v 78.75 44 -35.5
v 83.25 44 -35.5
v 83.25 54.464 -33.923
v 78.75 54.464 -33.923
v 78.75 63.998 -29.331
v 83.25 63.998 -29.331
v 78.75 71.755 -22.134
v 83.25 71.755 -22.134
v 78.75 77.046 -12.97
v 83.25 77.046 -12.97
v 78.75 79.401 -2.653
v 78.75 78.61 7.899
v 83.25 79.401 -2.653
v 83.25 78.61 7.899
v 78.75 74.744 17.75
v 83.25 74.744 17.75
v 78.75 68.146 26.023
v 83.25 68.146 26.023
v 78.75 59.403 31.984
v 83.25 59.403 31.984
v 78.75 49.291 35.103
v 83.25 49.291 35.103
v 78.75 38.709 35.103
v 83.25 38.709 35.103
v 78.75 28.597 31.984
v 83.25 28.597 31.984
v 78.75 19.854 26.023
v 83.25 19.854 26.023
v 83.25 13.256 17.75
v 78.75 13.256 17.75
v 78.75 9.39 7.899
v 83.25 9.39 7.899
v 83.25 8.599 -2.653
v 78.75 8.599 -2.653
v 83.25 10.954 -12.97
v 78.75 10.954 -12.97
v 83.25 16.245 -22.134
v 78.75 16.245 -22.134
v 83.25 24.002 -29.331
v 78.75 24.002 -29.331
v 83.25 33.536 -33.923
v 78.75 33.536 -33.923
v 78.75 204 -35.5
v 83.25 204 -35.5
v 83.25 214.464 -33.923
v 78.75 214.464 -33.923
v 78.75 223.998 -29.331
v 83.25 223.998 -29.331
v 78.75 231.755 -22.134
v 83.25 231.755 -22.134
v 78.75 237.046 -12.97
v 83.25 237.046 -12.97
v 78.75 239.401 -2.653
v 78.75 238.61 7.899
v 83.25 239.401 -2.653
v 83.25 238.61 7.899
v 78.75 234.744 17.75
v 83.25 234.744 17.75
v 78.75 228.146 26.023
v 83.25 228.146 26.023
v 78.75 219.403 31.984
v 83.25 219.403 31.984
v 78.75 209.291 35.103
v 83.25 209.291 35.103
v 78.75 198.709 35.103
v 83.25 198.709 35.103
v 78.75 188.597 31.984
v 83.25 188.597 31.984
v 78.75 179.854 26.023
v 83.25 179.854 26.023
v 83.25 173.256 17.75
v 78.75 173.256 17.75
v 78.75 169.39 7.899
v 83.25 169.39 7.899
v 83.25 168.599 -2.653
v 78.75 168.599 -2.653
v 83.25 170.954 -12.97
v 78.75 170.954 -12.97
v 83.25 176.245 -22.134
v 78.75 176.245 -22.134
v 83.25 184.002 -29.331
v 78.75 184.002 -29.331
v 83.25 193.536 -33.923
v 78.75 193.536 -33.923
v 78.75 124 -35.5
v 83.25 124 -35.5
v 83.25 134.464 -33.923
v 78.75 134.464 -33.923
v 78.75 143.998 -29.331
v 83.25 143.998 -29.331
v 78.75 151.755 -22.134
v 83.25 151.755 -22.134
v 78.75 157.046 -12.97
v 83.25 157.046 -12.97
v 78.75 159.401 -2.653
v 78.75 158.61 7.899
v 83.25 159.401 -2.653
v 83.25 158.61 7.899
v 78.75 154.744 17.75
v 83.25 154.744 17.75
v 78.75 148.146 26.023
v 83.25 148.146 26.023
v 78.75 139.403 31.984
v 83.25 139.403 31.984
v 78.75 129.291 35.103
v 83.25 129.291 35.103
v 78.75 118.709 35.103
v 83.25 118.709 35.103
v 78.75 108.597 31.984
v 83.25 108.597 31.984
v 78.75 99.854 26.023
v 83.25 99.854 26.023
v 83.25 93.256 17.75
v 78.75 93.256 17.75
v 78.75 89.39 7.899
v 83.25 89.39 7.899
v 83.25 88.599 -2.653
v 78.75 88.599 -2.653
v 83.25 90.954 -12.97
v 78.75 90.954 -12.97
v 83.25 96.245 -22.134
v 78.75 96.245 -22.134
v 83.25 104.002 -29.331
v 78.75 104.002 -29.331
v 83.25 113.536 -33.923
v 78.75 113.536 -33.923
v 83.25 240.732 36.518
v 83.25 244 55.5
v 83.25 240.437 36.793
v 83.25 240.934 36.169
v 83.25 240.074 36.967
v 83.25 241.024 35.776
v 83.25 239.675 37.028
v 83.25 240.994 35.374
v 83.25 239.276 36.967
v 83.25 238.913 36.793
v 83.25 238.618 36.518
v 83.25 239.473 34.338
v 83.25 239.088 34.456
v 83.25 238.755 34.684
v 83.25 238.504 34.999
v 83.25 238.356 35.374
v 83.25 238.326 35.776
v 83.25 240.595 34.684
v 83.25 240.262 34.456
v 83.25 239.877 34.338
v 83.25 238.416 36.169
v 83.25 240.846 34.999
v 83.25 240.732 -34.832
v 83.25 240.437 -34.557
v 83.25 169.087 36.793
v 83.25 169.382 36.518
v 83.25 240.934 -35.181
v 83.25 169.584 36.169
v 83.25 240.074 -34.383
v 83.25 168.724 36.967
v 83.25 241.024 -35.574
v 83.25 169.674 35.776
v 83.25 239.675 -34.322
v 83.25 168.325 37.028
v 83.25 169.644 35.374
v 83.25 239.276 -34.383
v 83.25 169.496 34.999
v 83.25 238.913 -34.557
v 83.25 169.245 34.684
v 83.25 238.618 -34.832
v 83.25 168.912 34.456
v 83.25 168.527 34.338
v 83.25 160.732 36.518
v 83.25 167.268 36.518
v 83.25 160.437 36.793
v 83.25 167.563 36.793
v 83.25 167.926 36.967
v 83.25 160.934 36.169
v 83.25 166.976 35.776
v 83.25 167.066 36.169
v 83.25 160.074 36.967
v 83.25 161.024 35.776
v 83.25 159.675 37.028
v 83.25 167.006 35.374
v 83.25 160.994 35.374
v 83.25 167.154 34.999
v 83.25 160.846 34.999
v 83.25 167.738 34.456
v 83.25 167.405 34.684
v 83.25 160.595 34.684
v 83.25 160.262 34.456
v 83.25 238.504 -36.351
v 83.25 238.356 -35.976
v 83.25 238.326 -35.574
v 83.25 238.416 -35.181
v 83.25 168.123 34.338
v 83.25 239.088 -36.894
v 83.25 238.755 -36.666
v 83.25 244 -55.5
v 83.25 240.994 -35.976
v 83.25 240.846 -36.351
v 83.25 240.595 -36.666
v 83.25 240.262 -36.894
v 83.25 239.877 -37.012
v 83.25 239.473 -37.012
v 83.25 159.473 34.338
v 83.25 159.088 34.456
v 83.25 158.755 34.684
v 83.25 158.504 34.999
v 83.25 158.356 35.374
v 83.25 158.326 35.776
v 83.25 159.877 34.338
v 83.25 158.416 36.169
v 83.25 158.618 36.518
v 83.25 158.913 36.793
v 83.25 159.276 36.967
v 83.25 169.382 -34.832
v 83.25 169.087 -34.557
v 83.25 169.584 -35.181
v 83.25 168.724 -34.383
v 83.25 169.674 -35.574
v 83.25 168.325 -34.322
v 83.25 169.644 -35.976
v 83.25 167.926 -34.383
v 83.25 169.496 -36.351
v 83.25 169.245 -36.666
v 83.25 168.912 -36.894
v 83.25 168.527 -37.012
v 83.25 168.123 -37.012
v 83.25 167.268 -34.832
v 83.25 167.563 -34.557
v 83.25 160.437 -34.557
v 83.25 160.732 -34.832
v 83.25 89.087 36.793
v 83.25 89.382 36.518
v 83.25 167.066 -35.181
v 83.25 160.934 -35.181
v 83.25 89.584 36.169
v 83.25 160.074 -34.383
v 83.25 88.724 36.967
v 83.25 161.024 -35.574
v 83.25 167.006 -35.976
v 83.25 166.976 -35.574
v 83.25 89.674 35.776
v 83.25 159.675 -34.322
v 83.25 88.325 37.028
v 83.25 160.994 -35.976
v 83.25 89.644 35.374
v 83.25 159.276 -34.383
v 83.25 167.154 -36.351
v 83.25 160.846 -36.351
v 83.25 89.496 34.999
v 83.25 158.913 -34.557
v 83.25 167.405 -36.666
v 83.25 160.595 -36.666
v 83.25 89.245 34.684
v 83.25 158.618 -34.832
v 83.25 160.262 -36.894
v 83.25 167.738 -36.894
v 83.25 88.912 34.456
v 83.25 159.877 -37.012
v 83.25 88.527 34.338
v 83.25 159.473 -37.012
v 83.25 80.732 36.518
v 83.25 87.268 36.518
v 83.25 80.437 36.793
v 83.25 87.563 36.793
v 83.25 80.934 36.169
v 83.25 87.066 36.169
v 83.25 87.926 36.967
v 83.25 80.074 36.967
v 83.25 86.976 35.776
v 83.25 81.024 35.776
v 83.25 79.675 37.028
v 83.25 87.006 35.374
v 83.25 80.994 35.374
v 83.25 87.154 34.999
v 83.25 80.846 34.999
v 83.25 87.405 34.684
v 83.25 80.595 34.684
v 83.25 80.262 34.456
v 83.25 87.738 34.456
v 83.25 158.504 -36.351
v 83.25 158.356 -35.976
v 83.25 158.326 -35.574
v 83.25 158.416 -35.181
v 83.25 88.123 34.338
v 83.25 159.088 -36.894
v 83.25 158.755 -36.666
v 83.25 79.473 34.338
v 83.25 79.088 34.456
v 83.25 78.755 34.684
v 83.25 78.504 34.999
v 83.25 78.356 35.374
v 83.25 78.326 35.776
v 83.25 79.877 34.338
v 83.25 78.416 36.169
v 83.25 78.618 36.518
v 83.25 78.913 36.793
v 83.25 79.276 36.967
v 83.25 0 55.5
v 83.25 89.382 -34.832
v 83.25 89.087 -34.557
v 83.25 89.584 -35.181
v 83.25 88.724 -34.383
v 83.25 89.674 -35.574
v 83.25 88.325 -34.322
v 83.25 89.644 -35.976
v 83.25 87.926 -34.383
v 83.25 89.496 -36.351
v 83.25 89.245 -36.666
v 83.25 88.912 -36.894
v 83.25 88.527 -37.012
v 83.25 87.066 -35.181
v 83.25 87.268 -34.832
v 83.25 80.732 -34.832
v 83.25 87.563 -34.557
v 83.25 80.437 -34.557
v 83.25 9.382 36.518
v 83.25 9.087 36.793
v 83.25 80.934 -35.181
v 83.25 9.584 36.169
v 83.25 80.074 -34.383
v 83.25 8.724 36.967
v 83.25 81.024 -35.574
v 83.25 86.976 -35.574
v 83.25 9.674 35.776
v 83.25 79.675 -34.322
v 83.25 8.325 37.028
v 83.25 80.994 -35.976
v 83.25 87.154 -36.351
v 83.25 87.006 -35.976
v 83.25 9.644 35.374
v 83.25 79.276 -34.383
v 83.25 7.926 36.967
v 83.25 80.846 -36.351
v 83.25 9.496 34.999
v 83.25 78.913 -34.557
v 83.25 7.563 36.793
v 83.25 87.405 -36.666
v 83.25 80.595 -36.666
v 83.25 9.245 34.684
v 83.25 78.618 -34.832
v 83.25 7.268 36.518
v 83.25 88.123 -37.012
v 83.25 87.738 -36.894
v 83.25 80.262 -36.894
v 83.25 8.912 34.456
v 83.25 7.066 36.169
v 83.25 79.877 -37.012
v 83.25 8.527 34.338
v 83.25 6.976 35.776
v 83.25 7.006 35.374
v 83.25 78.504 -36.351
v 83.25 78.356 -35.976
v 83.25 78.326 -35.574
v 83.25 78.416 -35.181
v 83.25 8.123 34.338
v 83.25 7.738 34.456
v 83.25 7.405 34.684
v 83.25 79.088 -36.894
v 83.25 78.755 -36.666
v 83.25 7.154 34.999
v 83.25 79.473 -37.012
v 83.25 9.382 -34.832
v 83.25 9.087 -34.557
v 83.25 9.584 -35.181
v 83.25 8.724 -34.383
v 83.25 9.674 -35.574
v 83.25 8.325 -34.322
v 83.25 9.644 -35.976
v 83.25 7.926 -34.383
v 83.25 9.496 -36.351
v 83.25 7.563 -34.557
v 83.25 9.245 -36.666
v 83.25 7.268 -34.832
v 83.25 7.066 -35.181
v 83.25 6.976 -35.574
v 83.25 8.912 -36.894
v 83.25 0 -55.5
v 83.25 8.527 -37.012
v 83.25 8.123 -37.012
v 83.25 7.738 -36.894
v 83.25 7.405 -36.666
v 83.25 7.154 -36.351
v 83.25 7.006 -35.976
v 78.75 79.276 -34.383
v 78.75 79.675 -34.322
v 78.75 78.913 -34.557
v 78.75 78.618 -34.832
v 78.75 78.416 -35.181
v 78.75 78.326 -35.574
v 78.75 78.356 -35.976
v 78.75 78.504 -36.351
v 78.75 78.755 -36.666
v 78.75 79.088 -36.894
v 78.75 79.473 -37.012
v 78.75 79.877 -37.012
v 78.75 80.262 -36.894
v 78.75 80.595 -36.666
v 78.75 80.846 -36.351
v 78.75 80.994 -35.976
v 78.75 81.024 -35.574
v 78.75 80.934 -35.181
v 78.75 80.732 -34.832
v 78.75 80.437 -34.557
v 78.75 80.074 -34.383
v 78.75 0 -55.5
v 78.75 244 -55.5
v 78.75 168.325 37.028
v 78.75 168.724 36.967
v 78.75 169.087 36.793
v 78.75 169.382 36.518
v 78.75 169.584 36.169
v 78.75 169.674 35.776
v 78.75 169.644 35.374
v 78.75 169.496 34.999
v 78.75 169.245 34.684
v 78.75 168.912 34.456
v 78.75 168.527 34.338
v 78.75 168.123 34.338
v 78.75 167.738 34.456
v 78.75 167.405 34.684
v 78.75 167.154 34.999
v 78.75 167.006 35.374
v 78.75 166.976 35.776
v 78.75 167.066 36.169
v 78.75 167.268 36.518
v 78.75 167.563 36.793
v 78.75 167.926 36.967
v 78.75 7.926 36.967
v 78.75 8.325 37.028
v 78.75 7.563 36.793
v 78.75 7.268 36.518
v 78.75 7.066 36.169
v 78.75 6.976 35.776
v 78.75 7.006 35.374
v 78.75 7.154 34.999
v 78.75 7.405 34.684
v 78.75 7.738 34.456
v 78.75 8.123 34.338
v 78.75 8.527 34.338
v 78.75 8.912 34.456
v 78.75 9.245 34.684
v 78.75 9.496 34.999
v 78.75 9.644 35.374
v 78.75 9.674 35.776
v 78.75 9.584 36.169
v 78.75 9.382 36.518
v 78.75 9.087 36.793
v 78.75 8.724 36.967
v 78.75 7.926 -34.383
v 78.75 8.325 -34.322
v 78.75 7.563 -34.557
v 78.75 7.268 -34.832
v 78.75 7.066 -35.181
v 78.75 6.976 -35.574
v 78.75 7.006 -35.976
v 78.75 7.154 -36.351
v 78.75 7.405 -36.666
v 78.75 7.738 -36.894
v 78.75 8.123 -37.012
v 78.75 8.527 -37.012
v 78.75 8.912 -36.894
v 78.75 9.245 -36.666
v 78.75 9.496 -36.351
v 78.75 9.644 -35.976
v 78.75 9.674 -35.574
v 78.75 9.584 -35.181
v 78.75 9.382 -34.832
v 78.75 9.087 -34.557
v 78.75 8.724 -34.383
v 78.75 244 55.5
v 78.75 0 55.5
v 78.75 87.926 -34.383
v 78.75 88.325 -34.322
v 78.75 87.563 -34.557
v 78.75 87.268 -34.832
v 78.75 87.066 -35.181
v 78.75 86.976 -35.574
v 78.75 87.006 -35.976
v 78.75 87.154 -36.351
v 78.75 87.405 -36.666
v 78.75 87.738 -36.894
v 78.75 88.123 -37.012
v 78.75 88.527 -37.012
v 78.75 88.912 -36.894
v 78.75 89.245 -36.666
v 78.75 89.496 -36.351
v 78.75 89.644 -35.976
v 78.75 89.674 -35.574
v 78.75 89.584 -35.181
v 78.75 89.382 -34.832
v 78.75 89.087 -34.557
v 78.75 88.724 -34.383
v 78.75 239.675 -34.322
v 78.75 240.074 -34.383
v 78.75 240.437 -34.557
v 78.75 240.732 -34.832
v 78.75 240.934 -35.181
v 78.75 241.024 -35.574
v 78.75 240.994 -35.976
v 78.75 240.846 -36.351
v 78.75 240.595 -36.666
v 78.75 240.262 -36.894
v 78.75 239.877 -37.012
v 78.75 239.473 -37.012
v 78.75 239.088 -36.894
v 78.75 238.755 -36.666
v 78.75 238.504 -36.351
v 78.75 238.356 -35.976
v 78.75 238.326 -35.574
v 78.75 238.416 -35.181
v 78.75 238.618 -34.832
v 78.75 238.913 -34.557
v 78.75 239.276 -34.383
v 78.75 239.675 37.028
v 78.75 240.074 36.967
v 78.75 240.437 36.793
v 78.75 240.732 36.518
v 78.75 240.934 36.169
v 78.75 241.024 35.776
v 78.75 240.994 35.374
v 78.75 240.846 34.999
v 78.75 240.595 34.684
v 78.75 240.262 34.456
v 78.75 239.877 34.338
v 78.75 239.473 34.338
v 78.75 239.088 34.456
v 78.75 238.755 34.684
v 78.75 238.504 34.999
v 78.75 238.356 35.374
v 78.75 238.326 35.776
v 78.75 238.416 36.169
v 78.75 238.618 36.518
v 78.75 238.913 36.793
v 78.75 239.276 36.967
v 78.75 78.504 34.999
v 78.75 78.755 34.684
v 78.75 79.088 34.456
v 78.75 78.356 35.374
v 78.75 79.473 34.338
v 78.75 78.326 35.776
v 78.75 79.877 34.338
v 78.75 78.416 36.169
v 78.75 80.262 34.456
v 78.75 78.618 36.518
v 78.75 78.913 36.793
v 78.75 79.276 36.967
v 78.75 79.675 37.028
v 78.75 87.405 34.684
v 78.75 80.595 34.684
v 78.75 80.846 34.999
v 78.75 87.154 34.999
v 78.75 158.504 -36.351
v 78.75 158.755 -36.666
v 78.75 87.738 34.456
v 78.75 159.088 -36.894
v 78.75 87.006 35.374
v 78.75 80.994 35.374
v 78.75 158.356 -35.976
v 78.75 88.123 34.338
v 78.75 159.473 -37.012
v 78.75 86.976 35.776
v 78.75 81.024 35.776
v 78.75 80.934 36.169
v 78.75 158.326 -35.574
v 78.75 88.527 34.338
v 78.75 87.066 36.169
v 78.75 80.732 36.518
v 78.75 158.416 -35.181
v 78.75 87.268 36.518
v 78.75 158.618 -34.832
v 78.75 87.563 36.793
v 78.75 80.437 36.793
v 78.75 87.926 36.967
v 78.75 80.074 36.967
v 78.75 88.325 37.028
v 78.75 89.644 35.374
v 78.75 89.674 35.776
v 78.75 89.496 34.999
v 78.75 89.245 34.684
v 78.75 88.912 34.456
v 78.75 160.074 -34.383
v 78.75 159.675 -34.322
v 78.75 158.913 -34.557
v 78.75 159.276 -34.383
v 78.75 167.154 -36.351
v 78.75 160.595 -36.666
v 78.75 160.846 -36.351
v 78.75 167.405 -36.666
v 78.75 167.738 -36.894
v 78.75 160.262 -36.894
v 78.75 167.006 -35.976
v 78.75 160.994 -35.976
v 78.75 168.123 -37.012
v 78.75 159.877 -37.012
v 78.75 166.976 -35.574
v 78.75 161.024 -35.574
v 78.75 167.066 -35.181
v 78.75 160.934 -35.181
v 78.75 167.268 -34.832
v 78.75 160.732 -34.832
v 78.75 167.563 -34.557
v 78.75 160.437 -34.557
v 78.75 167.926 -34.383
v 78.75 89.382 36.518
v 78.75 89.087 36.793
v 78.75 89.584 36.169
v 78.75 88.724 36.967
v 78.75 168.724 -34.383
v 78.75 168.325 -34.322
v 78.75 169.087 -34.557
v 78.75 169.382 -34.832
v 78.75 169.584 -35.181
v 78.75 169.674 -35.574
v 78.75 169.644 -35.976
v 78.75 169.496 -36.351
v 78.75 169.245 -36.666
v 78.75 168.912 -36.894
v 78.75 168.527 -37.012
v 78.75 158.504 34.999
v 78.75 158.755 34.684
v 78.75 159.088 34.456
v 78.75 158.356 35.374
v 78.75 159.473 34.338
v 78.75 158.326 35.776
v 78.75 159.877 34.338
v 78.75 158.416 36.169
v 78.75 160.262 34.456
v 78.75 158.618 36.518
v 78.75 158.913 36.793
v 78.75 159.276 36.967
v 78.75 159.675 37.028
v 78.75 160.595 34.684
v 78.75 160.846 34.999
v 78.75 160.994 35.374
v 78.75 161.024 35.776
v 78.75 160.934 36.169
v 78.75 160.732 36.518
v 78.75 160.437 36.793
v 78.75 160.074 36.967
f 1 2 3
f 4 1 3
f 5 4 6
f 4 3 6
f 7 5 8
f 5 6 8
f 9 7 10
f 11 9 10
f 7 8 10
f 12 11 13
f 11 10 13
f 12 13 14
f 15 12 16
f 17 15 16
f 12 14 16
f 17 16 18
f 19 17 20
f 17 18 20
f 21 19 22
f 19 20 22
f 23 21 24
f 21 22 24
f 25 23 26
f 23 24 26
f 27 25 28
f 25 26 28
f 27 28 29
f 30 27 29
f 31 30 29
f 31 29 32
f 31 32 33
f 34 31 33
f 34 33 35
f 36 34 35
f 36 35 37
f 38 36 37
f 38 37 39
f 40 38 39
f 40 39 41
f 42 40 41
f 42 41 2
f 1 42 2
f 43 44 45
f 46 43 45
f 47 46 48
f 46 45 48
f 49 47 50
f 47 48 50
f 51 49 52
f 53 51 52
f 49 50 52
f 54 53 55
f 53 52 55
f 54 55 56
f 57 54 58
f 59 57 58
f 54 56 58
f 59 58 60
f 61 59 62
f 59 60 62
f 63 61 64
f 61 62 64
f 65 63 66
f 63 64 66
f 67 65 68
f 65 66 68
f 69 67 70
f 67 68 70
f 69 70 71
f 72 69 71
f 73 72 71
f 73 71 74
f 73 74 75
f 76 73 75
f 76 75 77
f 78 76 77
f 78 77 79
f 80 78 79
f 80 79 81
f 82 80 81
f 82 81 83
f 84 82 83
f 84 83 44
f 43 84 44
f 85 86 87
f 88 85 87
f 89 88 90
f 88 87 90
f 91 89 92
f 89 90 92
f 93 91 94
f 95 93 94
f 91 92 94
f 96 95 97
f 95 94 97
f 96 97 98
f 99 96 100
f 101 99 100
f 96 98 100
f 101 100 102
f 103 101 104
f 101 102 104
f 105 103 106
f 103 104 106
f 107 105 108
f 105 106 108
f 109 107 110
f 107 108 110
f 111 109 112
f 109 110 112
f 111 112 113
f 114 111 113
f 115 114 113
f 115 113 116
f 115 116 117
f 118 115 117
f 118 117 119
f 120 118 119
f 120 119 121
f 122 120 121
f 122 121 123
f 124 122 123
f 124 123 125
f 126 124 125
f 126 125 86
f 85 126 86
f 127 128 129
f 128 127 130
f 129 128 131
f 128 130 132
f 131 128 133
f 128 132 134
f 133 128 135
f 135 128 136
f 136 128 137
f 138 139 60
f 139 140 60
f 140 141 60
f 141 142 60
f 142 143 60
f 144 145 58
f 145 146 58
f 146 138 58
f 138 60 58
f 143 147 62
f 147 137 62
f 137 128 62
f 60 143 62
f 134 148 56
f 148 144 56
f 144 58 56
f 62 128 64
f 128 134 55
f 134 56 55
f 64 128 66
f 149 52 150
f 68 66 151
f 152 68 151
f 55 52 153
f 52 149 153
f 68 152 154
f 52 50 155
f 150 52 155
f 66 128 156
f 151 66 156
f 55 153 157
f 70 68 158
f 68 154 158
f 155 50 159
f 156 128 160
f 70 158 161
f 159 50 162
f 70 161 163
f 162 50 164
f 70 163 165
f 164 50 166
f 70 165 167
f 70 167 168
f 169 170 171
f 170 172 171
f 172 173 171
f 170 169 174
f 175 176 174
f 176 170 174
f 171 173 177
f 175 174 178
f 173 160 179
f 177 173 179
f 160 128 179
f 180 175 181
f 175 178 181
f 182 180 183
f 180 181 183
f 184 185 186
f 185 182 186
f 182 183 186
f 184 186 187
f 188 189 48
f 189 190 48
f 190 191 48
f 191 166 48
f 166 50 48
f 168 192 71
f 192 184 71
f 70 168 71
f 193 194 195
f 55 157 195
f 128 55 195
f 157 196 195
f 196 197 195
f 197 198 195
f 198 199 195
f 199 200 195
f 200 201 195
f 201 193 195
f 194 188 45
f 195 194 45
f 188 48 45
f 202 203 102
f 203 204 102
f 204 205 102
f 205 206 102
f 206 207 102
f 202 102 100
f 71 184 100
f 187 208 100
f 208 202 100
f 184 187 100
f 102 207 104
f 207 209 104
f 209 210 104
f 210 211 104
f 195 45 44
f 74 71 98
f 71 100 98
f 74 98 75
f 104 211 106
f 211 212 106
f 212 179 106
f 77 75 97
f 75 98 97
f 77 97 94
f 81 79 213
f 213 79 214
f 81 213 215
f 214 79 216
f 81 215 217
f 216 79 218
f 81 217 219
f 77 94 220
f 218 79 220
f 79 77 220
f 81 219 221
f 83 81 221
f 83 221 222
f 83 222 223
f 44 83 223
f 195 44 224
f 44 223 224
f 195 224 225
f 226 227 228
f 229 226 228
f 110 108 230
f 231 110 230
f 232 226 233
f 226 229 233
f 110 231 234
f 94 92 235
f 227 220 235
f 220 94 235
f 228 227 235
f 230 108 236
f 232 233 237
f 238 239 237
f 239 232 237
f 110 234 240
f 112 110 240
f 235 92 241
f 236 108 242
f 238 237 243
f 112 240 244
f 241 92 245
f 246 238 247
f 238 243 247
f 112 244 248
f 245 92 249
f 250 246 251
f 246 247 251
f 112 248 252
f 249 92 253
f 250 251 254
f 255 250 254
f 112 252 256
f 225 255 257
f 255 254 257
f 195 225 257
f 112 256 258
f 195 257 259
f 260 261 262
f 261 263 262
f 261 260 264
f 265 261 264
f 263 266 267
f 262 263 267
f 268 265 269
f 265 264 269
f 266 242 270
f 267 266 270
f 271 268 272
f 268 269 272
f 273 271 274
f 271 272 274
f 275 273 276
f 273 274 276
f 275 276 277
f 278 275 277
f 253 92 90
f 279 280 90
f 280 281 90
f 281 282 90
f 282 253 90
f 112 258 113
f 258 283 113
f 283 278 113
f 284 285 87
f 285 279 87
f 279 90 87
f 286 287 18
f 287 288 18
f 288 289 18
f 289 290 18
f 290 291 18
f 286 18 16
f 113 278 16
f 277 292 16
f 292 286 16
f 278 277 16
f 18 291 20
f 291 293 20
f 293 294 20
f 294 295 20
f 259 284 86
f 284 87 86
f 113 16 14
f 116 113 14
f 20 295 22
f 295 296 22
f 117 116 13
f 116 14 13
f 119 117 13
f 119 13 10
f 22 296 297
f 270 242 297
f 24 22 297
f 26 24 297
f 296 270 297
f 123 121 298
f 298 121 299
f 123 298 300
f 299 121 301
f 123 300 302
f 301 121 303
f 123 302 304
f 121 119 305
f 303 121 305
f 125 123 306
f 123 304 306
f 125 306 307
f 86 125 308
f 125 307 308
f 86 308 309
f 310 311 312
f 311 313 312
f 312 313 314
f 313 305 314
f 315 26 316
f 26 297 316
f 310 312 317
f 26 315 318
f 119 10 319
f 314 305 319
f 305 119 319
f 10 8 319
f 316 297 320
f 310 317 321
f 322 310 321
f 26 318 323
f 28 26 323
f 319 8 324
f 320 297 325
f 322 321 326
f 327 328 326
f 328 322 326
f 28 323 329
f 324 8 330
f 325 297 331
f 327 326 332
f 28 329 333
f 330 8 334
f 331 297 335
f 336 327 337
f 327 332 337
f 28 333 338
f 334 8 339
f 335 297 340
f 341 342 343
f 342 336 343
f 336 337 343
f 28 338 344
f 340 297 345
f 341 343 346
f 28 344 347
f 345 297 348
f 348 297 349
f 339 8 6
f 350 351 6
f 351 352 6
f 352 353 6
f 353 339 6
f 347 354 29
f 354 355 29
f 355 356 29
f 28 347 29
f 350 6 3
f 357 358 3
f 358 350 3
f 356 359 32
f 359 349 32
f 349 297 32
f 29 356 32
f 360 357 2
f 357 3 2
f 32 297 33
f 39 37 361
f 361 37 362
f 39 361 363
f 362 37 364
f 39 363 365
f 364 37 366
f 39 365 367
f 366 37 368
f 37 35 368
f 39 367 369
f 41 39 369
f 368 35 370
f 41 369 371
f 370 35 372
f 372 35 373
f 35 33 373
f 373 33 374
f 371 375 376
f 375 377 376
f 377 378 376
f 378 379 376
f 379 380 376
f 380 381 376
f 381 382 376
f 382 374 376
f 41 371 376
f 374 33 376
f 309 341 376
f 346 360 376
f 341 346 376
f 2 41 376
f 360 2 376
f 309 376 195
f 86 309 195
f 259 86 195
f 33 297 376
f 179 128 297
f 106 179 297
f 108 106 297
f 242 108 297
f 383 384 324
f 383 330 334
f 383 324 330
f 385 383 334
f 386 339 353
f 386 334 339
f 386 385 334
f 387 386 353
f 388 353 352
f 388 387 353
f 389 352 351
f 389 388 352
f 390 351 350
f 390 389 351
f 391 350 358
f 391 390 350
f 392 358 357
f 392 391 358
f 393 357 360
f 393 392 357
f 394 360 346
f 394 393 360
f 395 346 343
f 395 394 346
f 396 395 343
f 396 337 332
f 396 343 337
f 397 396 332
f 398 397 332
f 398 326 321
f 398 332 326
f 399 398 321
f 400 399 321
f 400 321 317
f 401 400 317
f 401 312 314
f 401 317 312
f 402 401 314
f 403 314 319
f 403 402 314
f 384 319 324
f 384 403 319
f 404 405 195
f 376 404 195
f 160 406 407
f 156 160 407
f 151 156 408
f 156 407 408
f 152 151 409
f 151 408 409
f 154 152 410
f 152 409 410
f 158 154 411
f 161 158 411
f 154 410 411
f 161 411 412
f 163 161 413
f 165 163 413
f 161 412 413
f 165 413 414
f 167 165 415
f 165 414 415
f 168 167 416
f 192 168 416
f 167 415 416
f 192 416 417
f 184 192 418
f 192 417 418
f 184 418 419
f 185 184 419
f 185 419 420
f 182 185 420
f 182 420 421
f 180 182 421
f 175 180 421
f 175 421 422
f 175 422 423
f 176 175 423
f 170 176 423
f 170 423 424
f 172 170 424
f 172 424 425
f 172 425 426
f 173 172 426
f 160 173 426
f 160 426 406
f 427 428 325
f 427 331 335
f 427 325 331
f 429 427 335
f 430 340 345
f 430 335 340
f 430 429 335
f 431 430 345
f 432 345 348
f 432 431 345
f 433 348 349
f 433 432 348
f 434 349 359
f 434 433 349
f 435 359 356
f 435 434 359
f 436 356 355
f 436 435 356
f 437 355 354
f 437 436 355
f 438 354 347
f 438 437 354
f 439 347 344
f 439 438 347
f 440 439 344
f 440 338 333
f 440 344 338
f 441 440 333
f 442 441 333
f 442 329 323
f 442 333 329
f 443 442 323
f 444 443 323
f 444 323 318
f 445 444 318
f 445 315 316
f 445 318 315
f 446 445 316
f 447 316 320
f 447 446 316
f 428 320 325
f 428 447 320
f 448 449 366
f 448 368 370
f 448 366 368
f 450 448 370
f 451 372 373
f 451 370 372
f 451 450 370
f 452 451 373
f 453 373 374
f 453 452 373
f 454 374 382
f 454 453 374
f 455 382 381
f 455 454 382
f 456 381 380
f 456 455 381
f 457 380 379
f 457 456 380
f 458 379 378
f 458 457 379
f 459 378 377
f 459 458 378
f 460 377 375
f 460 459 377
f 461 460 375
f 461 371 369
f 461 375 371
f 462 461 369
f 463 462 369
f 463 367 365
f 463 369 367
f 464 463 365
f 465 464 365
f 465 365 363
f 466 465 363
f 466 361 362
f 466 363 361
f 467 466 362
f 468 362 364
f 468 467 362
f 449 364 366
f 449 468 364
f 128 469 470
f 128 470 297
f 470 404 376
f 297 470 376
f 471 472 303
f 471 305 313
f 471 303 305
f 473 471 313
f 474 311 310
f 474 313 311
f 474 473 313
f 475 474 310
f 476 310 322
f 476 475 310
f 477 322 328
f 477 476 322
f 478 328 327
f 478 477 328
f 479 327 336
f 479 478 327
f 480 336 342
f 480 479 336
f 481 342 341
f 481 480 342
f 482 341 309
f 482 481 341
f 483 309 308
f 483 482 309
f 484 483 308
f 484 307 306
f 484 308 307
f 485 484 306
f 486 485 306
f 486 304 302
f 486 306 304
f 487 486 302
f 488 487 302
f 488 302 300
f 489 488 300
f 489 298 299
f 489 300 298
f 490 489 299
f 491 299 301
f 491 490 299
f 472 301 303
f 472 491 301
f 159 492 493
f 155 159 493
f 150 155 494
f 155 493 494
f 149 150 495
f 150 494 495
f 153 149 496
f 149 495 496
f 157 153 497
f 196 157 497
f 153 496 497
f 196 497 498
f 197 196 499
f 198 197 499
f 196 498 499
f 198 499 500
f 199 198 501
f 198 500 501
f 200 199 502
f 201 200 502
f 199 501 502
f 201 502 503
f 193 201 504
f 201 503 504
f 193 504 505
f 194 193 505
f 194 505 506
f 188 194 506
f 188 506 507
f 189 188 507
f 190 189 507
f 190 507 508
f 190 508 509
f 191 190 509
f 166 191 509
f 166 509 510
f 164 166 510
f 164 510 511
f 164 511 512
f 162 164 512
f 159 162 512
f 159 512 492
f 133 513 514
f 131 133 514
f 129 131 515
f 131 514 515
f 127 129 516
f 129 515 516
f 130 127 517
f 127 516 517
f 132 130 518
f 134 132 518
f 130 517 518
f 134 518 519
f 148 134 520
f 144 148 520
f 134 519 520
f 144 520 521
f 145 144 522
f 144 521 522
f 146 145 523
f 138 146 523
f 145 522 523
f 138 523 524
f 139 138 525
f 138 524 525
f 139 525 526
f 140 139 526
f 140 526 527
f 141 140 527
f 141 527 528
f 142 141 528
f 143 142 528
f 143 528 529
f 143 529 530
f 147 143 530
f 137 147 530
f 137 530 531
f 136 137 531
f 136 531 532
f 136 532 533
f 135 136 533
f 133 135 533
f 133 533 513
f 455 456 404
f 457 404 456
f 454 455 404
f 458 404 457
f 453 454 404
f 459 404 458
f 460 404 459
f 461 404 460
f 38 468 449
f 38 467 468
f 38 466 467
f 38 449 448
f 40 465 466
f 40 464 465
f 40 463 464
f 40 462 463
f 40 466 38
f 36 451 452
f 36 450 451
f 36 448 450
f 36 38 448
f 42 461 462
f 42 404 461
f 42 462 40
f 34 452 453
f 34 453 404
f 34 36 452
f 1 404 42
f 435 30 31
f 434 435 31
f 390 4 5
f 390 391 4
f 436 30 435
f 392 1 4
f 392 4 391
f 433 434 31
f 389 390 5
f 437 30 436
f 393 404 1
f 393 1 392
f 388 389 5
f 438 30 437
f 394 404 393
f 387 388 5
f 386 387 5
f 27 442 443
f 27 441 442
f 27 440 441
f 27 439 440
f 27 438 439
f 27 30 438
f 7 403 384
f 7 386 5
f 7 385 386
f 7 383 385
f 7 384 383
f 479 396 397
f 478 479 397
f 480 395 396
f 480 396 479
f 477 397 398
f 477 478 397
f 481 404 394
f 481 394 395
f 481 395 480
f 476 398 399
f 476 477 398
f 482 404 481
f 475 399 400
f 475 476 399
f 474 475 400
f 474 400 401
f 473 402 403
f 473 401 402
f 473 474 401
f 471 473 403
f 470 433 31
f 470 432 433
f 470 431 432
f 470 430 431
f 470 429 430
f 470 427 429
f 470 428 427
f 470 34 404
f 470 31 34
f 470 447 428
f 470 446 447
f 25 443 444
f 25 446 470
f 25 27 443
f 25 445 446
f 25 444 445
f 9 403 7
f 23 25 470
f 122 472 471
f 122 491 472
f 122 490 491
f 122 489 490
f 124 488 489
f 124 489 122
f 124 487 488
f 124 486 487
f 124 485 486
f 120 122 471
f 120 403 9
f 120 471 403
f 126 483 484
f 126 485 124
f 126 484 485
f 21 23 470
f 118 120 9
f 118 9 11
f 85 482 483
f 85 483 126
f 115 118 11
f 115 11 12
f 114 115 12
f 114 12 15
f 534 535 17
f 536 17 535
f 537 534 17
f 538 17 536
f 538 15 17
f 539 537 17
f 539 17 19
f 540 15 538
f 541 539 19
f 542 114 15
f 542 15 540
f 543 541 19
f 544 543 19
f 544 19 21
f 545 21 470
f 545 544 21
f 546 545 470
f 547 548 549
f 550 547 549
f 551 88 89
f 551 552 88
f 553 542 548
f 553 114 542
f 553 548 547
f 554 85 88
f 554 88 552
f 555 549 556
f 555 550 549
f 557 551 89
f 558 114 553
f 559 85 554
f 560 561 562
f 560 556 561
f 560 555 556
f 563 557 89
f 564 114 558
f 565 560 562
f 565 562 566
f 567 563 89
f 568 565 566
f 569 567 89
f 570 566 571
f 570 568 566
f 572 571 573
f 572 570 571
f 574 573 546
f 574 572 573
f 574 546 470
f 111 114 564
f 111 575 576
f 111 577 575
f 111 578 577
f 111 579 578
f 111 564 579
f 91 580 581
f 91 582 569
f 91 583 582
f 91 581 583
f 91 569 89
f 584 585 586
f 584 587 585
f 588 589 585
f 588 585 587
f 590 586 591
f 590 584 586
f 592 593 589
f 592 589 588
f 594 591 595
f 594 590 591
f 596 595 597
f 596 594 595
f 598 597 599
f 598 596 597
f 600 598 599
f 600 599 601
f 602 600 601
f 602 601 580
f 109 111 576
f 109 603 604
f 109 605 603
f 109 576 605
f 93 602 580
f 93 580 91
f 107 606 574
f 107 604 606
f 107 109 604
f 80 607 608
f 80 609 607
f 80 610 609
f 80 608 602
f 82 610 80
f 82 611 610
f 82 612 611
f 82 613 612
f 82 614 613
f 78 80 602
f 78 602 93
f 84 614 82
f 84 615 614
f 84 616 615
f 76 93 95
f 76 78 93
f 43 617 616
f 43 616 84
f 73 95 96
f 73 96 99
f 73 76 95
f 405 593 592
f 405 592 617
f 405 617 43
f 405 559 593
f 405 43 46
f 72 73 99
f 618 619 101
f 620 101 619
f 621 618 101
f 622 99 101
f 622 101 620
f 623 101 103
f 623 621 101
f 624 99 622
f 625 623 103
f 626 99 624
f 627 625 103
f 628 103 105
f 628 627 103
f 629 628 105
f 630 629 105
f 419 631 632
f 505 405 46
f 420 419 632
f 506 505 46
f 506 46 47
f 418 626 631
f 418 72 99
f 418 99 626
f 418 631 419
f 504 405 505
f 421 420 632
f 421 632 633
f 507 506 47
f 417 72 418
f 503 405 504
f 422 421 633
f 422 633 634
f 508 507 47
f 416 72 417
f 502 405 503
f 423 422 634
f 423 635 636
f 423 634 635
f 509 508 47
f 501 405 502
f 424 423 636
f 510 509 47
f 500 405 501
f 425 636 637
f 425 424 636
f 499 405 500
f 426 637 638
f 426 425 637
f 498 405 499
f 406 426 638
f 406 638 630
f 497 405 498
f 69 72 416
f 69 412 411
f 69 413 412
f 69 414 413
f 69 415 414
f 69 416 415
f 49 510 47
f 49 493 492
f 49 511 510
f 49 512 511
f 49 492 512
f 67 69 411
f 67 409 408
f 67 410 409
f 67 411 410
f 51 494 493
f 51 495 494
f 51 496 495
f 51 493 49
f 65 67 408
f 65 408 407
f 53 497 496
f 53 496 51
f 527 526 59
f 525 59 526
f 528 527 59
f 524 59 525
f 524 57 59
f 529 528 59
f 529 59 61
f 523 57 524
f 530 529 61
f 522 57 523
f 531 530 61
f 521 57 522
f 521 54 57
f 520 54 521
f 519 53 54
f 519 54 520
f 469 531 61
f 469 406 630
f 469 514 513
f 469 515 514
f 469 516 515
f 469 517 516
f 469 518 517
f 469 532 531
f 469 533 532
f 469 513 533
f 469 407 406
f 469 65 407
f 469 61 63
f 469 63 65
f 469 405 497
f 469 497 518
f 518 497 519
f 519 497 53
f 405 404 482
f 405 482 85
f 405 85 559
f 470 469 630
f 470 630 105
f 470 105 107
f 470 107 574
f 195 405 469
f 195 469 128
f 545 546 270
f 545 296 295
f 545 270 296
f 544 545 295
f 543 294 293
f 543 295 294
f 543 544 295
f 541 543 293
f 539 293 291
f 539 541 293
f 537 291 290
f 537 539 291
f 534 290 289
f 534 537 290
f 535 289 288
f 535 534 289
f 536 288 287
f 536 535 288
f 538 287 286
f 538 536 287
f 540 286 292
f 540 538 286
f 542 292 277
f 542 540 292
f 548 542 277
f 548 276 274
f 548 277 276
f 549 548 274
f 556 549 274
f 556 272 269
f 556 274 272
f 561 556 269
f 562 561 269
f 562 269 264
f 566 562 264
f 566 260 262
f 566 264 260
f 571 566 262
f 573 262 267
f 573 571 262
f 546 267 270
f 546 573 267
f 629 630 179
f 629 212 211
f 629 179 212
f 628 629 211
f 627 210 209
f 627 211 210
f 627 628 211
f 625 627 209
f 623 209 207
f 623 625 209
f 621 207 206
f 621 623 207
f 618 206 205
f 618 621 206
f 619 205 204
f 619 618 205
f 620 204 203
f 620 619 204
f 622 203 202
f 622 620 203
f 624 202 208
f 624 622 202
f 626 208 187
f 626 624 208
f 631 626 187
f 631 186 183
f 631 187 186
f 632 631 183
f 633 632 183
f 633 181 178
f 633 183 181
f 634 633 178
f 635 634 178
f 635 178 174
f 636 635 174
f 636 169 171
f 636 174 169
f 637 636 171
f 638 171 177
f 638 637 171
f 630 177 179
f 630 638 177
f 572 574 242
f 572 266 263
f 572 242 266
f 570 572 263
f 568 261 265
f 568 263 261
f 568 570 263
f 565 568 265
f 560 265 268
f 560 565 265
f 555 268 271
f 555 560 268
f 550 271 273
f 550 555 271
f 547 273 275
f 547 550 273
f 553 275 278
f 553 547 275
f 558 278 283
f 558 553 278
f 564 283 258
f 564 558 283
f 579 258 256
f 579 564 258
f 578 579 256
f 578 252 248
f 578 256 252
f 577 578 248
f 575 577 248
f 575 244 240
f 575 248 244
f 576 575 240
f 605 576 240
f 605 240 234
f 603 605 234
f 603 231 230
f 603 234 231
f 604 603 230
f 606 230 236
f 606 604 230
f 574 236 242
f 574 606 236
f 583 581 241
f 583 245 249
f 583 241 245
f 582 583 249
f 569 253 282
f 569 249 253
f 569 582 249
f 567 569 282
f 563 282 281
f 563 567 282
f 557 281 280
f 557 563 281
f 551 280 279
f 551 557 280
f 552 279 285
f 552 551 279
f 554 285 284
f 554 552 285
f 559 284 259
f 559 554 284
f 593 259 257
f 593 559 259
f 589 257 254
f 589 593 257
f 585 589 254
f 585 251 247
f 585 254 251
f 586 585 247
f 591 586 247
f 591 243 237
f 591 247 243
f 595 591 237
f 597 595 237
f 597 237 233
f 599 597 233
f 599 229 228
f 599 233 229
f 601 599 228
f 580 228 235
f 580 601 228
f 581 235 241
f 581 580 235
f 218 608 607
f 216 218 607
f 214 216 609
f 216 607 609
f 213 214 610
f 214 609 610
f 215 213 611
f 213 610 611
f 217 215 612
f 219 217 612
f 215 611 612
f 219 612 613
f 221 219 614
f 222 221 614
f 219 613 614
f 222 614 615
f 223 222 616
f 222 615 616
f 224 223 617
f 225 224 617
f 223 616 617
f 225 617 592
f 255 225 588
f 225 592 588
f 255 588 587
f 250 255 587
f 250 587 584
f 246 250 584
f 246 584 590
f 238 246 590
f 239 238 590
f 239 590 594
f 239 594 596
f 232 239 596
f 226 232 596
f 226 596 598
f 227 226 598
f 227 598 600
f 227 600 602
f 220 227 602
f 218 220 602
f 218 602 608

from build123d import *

# Parameters (mm, degrees)
SKETCH1_W                     = 166.5
SKETCH1_H                     = 111
BOSS_EXTRUDE1_DEPTH           = 30.5
SHELL1_T                      = -4.5
CUT_EXTRUDE1_REACH            = 105.377
SKETCH2_W                     = 157
SKETCH2_H                     = 92
TAP_DRILL_FOR_6_32_TAP1_D     = 2.7051
TAP_DRILL_FOR_6_32_TAP1_DEPTH = 4.5
LPATTERN1_COUNT               = 8
LPATTERN1_PITCH               = 30.5
SKETCH7_W                     = 102
SKETCH7_H                     = 4.5
CUT_EXTRUDE2_DEPTH            = 5
SKETCH8_W                     = 102
SKETCH8_H                     = 157
CUT_EXTRUDE3_DEPTH            = 5
CUT_EXTRUDE4_REACH            = 302.564
SKETCH9_R                     = 35.5
TAP_DRILL_FOR_6_32_TAP2_D     = 2.7051
CUT_EXTRUDE6_START            = -162
SKETCH14_W                    = 111
SKETCH14_H                    = 244
CUT_EXTRUDE6_DEPTH            = 162


with BuildPart() as part:
    # Sketch1 → Boss-Extrude1 (new body)
    with BuildSketch(Plane(origin=(0, 0, 0), x_dir=(1, 0, 0), z_dir=(0, 1, 0))):
        Rectangle(SKETCH1_W, SKETCH1_H)
    extrude(amount=BOSS_EXTRUDE1_DEPTH)

    # Shell1
    shell1_openings = [part.faces().sort_by_distance(p)[0] for p in [
        (0, 30.5, 0),
        (-83.25, 15.25, 0),
    ]]
    offset(amount=SHELL1_T, openings=shell1_openings, kind=Kind.INTERSECTION)

    # Sketch2 → Cut-Extrude1 (cut, up to next)
    with BuildSketch(Plane(origin=(0, 4.5, 0), x_dir=(1, 0, 0), z_dir=(0, 1, 0)), mode=Mode.PRIVATE) as cut_extrude1_sk1:
        with Locations((0.25, 0)):
            Rectangle(SKETCH2_W, SKETCH2_H)
    cut_extrude1_tool1 = extrude(cut_extrude1_sk1.sketch, amount=-CUT_EXTRUDE1_REACH, mode=Mode.PRIVATE) & part.part
    add(cut_extrude1_tool1.solids().sort_by_distance((0.25, 4.5, 0))[0], mode=Mode.SUBTRACT)

    # Tap Drill for #6-32 Tap1
    with Locations(Plane(origin=(0, 0, -55.5), x_dir=(-1, 0, 0), z_dir=(0, 0, -1))):
        with Locations((42.66, 10.84), (-58.75, 10.84)):
            tap_drill_for_6_32_tap1 = Hole(TAP_DRILL_FOR_6_32_TAP1_D / 2, depth=TAP_DRILL_FOR_6_32_TAP1_DEPTH)

    # Mirror1: Tap Drill for #6-32 Tap1 across plane
    add(tap_drill_for_6_32_tap1.mirror(Plane.XY), mode=Mode.SUBTRACT)


with BuildPart() as lpattern1_1:
    # LPattern1: pattern copy
    add(part.part.moved(Location(Vector(0, 1, 0) * (1 * LPATTERN1_PITCH))))


with BuildPart() as lpattern1_2:
    # LPattern1: pattern copy
    add(part.part.moved(Location(Vector(0, 1, 0) * (2 * LPATTERN1_PITCH))))


with BuildPart() as lpattern1_3:
    # LPattern1: pattern copy
    add(part.part.moved(Location(Vector(0, 1, 0) * (3 * LPATTERN1_PITCH))))


with BuildPart() as lpattern1_4:
    # LPattern1: pattern copy
    add(part.part.moved(Location(Vector(0, 1, 0) * (4 * LPATTERN1_PITCH))))


with BuildPart() as lpattern1_5:
    # LPattern1: pattern copy
    add(part.part.moved(Location(Vector(0, 1, 0) * (5 * LPATTERN1_PITCH))))


with BuildPart() as lpattern1_6:
    # LPattern1: pattern copy
    add(part.part.moved(Location(Vector(0, 1, 0) * (6 * LPATTERN1_PITCH))))


with BuildPart() as lpattern1_7:
    # LPattern1: pattern copy
    add(part.part.moved(Location(Vector(0, 1, 0) * (7 * LPATTERN1_PITCH))))


with BuildPart() as part_1:
    add(part.part)

    # Combine1: union LPattern1_1
    add(lpattern1_1.part)

    # Sketch7 → Cut-Extrude2 (cut)
    with BuildSketch(Plane.ZY.offset(83.25)):
        with Locations((0, 32.75)):
            Rectangle(SKETCH7_W, SKETCH7_H)
    extrude(amount=-CUT_EXTRUDE2_DEPTH, mode=Mode.SUBTRACT)


with BuildPart() as lpattern1_2_1:
    add(lpattern1_2.part)

    # Combine2: union LPattern1_3, LPattern1_5, LPattern1_4, LPattern1_7, part, LPattern1_6
    add(lpattern1_3.part)
    add(lpattern1_5.part)
    add(lpattern1_4.part)
    add(lpattern1_7.part)
    add(part_1.part)
    add(lpattern1_6.part)

    # Sketch8 → Cut-Extrude3 (cut)
    with BuildSketch(Plane.ZY.offset(83.25)):
        with Locations((0, 139.5)):
            Rectangle(SKETCH8_W, SKETCH8_H)
    extrude(amount=-CUT_EXTRUDE3_DEPTH, mode=Mode.SUBTRACT)

    # Sketch9 → Cut-Extrude4 (cut, up to next)
    with BuildSketch(Plane(origin=(83.25, 0, 0), x_dir=(0, 0, -1), z_dir=(1, 0, 0)), mode=Mode.PRIVATE) as cut_extrude4_sk1:
        with Locations((0, 204)):
            Circle(SKETCH9_R)
    cut_extrude4_tool1 = extrude(cut_extrude4_sk1.sketch, amount=-CUT_EXTRUDE4_REACH, mode=Mode.PRIVATE) & lpattern1_2_1.part
    # Sketch9 → Cut-Extrude4 (cut, up to next)
    with BuildSketch(Plane(origin=(83.25, 0, 0), x_dir=(0, 0, -1), z_dir=(1, 0, 0)), mode=Mode.PRIVATE) as cut_extrude4_sk2:
        with Locations((0, 124)):
            Circle(SKETCH9_R)
    cut_extrude4_tool2 = extrude(cut_extrude4_sk2.sketch, amount=-CUT_EXTRUDE4_REACH, mode=Mode.PRIVATE) & lpattern1_2_1.part
    # Sketch9 → Cut-Extrude4 (cut, up to next)
    with BuildSketch(Plane(origin=(83.25, 0, 0), x_dir=(0, 0, -1), z_dir=(1, 0, 0)), mode=Mode.PRIVATE) as cut_extrude4_sk3:
        with Locations((0, 44)):
            Circle(SKETCH9_R)
    cut_extrude4_tool3 = extrude(cut_extrude4_sk3.sketch, amount=-CUT_EXTRUDE4_REACH, mode=Mode.PRIVATE) & lpattern1_2_1.part
    add(cut_extrude4_tool1.solids().sort_by_distance((83.25, 204, 0))[0], mode=Mode.SUBTRACT)
    add(cut_extrude4_tool2.solids().sort_by_distance((83.25, 124, 0))[0], mode=Mode.SUBTRACT)
    add(cut_extrude4_tool3.solids().sort_by_distance((83.25, 44, 0))[0], mode=Mode.SUBTRACT)

    # Tap Drill for #6-32 Tap2 (through all)
    with Locations(Plane(origin=(83.25, 0, 0), x_dir=(0, 0, -1), z_dir=(1, 0, 0))):
        with Locations((-35.675, 239.675), (35.675, 239.675), (35.675, 168.325), (-35.675, 168.325)):
            tap_drill_for_6_32_tap2 = Hole(TAP_DRILL_FOR_6_32_TAP2_D / 2)

    # Mirror2: Tap Drill for #6-32 Tap2 across plane
    add(tap_drill_for_6_32_tap2.mirror(Plane.ZX.offset(164)), mode=Mode.SUBTRACT)

    # Mirror3: Tap Drill for #6-32 Tap2 across plane
    add(tap_drill_for_6_32_tap2.mirror(Plane.ZX.offset(124)), mode=Mode.SUBTRACT)

    # Sketch14 → Cut-Extrude6 (cut)
    with BuildSketch(Plane.ZY.offset(83.25).offset(CUT_EXTRUDE6_START)):
        with Locations((0, 122)):
            Rectangle(SKETCH14_W, SKETCH14_H)
    extrude(amount=CUT_EXTRUDE6_DEPTH, mode=Mode.SUBTRACT)


solid = lpattern1_2_1.part
